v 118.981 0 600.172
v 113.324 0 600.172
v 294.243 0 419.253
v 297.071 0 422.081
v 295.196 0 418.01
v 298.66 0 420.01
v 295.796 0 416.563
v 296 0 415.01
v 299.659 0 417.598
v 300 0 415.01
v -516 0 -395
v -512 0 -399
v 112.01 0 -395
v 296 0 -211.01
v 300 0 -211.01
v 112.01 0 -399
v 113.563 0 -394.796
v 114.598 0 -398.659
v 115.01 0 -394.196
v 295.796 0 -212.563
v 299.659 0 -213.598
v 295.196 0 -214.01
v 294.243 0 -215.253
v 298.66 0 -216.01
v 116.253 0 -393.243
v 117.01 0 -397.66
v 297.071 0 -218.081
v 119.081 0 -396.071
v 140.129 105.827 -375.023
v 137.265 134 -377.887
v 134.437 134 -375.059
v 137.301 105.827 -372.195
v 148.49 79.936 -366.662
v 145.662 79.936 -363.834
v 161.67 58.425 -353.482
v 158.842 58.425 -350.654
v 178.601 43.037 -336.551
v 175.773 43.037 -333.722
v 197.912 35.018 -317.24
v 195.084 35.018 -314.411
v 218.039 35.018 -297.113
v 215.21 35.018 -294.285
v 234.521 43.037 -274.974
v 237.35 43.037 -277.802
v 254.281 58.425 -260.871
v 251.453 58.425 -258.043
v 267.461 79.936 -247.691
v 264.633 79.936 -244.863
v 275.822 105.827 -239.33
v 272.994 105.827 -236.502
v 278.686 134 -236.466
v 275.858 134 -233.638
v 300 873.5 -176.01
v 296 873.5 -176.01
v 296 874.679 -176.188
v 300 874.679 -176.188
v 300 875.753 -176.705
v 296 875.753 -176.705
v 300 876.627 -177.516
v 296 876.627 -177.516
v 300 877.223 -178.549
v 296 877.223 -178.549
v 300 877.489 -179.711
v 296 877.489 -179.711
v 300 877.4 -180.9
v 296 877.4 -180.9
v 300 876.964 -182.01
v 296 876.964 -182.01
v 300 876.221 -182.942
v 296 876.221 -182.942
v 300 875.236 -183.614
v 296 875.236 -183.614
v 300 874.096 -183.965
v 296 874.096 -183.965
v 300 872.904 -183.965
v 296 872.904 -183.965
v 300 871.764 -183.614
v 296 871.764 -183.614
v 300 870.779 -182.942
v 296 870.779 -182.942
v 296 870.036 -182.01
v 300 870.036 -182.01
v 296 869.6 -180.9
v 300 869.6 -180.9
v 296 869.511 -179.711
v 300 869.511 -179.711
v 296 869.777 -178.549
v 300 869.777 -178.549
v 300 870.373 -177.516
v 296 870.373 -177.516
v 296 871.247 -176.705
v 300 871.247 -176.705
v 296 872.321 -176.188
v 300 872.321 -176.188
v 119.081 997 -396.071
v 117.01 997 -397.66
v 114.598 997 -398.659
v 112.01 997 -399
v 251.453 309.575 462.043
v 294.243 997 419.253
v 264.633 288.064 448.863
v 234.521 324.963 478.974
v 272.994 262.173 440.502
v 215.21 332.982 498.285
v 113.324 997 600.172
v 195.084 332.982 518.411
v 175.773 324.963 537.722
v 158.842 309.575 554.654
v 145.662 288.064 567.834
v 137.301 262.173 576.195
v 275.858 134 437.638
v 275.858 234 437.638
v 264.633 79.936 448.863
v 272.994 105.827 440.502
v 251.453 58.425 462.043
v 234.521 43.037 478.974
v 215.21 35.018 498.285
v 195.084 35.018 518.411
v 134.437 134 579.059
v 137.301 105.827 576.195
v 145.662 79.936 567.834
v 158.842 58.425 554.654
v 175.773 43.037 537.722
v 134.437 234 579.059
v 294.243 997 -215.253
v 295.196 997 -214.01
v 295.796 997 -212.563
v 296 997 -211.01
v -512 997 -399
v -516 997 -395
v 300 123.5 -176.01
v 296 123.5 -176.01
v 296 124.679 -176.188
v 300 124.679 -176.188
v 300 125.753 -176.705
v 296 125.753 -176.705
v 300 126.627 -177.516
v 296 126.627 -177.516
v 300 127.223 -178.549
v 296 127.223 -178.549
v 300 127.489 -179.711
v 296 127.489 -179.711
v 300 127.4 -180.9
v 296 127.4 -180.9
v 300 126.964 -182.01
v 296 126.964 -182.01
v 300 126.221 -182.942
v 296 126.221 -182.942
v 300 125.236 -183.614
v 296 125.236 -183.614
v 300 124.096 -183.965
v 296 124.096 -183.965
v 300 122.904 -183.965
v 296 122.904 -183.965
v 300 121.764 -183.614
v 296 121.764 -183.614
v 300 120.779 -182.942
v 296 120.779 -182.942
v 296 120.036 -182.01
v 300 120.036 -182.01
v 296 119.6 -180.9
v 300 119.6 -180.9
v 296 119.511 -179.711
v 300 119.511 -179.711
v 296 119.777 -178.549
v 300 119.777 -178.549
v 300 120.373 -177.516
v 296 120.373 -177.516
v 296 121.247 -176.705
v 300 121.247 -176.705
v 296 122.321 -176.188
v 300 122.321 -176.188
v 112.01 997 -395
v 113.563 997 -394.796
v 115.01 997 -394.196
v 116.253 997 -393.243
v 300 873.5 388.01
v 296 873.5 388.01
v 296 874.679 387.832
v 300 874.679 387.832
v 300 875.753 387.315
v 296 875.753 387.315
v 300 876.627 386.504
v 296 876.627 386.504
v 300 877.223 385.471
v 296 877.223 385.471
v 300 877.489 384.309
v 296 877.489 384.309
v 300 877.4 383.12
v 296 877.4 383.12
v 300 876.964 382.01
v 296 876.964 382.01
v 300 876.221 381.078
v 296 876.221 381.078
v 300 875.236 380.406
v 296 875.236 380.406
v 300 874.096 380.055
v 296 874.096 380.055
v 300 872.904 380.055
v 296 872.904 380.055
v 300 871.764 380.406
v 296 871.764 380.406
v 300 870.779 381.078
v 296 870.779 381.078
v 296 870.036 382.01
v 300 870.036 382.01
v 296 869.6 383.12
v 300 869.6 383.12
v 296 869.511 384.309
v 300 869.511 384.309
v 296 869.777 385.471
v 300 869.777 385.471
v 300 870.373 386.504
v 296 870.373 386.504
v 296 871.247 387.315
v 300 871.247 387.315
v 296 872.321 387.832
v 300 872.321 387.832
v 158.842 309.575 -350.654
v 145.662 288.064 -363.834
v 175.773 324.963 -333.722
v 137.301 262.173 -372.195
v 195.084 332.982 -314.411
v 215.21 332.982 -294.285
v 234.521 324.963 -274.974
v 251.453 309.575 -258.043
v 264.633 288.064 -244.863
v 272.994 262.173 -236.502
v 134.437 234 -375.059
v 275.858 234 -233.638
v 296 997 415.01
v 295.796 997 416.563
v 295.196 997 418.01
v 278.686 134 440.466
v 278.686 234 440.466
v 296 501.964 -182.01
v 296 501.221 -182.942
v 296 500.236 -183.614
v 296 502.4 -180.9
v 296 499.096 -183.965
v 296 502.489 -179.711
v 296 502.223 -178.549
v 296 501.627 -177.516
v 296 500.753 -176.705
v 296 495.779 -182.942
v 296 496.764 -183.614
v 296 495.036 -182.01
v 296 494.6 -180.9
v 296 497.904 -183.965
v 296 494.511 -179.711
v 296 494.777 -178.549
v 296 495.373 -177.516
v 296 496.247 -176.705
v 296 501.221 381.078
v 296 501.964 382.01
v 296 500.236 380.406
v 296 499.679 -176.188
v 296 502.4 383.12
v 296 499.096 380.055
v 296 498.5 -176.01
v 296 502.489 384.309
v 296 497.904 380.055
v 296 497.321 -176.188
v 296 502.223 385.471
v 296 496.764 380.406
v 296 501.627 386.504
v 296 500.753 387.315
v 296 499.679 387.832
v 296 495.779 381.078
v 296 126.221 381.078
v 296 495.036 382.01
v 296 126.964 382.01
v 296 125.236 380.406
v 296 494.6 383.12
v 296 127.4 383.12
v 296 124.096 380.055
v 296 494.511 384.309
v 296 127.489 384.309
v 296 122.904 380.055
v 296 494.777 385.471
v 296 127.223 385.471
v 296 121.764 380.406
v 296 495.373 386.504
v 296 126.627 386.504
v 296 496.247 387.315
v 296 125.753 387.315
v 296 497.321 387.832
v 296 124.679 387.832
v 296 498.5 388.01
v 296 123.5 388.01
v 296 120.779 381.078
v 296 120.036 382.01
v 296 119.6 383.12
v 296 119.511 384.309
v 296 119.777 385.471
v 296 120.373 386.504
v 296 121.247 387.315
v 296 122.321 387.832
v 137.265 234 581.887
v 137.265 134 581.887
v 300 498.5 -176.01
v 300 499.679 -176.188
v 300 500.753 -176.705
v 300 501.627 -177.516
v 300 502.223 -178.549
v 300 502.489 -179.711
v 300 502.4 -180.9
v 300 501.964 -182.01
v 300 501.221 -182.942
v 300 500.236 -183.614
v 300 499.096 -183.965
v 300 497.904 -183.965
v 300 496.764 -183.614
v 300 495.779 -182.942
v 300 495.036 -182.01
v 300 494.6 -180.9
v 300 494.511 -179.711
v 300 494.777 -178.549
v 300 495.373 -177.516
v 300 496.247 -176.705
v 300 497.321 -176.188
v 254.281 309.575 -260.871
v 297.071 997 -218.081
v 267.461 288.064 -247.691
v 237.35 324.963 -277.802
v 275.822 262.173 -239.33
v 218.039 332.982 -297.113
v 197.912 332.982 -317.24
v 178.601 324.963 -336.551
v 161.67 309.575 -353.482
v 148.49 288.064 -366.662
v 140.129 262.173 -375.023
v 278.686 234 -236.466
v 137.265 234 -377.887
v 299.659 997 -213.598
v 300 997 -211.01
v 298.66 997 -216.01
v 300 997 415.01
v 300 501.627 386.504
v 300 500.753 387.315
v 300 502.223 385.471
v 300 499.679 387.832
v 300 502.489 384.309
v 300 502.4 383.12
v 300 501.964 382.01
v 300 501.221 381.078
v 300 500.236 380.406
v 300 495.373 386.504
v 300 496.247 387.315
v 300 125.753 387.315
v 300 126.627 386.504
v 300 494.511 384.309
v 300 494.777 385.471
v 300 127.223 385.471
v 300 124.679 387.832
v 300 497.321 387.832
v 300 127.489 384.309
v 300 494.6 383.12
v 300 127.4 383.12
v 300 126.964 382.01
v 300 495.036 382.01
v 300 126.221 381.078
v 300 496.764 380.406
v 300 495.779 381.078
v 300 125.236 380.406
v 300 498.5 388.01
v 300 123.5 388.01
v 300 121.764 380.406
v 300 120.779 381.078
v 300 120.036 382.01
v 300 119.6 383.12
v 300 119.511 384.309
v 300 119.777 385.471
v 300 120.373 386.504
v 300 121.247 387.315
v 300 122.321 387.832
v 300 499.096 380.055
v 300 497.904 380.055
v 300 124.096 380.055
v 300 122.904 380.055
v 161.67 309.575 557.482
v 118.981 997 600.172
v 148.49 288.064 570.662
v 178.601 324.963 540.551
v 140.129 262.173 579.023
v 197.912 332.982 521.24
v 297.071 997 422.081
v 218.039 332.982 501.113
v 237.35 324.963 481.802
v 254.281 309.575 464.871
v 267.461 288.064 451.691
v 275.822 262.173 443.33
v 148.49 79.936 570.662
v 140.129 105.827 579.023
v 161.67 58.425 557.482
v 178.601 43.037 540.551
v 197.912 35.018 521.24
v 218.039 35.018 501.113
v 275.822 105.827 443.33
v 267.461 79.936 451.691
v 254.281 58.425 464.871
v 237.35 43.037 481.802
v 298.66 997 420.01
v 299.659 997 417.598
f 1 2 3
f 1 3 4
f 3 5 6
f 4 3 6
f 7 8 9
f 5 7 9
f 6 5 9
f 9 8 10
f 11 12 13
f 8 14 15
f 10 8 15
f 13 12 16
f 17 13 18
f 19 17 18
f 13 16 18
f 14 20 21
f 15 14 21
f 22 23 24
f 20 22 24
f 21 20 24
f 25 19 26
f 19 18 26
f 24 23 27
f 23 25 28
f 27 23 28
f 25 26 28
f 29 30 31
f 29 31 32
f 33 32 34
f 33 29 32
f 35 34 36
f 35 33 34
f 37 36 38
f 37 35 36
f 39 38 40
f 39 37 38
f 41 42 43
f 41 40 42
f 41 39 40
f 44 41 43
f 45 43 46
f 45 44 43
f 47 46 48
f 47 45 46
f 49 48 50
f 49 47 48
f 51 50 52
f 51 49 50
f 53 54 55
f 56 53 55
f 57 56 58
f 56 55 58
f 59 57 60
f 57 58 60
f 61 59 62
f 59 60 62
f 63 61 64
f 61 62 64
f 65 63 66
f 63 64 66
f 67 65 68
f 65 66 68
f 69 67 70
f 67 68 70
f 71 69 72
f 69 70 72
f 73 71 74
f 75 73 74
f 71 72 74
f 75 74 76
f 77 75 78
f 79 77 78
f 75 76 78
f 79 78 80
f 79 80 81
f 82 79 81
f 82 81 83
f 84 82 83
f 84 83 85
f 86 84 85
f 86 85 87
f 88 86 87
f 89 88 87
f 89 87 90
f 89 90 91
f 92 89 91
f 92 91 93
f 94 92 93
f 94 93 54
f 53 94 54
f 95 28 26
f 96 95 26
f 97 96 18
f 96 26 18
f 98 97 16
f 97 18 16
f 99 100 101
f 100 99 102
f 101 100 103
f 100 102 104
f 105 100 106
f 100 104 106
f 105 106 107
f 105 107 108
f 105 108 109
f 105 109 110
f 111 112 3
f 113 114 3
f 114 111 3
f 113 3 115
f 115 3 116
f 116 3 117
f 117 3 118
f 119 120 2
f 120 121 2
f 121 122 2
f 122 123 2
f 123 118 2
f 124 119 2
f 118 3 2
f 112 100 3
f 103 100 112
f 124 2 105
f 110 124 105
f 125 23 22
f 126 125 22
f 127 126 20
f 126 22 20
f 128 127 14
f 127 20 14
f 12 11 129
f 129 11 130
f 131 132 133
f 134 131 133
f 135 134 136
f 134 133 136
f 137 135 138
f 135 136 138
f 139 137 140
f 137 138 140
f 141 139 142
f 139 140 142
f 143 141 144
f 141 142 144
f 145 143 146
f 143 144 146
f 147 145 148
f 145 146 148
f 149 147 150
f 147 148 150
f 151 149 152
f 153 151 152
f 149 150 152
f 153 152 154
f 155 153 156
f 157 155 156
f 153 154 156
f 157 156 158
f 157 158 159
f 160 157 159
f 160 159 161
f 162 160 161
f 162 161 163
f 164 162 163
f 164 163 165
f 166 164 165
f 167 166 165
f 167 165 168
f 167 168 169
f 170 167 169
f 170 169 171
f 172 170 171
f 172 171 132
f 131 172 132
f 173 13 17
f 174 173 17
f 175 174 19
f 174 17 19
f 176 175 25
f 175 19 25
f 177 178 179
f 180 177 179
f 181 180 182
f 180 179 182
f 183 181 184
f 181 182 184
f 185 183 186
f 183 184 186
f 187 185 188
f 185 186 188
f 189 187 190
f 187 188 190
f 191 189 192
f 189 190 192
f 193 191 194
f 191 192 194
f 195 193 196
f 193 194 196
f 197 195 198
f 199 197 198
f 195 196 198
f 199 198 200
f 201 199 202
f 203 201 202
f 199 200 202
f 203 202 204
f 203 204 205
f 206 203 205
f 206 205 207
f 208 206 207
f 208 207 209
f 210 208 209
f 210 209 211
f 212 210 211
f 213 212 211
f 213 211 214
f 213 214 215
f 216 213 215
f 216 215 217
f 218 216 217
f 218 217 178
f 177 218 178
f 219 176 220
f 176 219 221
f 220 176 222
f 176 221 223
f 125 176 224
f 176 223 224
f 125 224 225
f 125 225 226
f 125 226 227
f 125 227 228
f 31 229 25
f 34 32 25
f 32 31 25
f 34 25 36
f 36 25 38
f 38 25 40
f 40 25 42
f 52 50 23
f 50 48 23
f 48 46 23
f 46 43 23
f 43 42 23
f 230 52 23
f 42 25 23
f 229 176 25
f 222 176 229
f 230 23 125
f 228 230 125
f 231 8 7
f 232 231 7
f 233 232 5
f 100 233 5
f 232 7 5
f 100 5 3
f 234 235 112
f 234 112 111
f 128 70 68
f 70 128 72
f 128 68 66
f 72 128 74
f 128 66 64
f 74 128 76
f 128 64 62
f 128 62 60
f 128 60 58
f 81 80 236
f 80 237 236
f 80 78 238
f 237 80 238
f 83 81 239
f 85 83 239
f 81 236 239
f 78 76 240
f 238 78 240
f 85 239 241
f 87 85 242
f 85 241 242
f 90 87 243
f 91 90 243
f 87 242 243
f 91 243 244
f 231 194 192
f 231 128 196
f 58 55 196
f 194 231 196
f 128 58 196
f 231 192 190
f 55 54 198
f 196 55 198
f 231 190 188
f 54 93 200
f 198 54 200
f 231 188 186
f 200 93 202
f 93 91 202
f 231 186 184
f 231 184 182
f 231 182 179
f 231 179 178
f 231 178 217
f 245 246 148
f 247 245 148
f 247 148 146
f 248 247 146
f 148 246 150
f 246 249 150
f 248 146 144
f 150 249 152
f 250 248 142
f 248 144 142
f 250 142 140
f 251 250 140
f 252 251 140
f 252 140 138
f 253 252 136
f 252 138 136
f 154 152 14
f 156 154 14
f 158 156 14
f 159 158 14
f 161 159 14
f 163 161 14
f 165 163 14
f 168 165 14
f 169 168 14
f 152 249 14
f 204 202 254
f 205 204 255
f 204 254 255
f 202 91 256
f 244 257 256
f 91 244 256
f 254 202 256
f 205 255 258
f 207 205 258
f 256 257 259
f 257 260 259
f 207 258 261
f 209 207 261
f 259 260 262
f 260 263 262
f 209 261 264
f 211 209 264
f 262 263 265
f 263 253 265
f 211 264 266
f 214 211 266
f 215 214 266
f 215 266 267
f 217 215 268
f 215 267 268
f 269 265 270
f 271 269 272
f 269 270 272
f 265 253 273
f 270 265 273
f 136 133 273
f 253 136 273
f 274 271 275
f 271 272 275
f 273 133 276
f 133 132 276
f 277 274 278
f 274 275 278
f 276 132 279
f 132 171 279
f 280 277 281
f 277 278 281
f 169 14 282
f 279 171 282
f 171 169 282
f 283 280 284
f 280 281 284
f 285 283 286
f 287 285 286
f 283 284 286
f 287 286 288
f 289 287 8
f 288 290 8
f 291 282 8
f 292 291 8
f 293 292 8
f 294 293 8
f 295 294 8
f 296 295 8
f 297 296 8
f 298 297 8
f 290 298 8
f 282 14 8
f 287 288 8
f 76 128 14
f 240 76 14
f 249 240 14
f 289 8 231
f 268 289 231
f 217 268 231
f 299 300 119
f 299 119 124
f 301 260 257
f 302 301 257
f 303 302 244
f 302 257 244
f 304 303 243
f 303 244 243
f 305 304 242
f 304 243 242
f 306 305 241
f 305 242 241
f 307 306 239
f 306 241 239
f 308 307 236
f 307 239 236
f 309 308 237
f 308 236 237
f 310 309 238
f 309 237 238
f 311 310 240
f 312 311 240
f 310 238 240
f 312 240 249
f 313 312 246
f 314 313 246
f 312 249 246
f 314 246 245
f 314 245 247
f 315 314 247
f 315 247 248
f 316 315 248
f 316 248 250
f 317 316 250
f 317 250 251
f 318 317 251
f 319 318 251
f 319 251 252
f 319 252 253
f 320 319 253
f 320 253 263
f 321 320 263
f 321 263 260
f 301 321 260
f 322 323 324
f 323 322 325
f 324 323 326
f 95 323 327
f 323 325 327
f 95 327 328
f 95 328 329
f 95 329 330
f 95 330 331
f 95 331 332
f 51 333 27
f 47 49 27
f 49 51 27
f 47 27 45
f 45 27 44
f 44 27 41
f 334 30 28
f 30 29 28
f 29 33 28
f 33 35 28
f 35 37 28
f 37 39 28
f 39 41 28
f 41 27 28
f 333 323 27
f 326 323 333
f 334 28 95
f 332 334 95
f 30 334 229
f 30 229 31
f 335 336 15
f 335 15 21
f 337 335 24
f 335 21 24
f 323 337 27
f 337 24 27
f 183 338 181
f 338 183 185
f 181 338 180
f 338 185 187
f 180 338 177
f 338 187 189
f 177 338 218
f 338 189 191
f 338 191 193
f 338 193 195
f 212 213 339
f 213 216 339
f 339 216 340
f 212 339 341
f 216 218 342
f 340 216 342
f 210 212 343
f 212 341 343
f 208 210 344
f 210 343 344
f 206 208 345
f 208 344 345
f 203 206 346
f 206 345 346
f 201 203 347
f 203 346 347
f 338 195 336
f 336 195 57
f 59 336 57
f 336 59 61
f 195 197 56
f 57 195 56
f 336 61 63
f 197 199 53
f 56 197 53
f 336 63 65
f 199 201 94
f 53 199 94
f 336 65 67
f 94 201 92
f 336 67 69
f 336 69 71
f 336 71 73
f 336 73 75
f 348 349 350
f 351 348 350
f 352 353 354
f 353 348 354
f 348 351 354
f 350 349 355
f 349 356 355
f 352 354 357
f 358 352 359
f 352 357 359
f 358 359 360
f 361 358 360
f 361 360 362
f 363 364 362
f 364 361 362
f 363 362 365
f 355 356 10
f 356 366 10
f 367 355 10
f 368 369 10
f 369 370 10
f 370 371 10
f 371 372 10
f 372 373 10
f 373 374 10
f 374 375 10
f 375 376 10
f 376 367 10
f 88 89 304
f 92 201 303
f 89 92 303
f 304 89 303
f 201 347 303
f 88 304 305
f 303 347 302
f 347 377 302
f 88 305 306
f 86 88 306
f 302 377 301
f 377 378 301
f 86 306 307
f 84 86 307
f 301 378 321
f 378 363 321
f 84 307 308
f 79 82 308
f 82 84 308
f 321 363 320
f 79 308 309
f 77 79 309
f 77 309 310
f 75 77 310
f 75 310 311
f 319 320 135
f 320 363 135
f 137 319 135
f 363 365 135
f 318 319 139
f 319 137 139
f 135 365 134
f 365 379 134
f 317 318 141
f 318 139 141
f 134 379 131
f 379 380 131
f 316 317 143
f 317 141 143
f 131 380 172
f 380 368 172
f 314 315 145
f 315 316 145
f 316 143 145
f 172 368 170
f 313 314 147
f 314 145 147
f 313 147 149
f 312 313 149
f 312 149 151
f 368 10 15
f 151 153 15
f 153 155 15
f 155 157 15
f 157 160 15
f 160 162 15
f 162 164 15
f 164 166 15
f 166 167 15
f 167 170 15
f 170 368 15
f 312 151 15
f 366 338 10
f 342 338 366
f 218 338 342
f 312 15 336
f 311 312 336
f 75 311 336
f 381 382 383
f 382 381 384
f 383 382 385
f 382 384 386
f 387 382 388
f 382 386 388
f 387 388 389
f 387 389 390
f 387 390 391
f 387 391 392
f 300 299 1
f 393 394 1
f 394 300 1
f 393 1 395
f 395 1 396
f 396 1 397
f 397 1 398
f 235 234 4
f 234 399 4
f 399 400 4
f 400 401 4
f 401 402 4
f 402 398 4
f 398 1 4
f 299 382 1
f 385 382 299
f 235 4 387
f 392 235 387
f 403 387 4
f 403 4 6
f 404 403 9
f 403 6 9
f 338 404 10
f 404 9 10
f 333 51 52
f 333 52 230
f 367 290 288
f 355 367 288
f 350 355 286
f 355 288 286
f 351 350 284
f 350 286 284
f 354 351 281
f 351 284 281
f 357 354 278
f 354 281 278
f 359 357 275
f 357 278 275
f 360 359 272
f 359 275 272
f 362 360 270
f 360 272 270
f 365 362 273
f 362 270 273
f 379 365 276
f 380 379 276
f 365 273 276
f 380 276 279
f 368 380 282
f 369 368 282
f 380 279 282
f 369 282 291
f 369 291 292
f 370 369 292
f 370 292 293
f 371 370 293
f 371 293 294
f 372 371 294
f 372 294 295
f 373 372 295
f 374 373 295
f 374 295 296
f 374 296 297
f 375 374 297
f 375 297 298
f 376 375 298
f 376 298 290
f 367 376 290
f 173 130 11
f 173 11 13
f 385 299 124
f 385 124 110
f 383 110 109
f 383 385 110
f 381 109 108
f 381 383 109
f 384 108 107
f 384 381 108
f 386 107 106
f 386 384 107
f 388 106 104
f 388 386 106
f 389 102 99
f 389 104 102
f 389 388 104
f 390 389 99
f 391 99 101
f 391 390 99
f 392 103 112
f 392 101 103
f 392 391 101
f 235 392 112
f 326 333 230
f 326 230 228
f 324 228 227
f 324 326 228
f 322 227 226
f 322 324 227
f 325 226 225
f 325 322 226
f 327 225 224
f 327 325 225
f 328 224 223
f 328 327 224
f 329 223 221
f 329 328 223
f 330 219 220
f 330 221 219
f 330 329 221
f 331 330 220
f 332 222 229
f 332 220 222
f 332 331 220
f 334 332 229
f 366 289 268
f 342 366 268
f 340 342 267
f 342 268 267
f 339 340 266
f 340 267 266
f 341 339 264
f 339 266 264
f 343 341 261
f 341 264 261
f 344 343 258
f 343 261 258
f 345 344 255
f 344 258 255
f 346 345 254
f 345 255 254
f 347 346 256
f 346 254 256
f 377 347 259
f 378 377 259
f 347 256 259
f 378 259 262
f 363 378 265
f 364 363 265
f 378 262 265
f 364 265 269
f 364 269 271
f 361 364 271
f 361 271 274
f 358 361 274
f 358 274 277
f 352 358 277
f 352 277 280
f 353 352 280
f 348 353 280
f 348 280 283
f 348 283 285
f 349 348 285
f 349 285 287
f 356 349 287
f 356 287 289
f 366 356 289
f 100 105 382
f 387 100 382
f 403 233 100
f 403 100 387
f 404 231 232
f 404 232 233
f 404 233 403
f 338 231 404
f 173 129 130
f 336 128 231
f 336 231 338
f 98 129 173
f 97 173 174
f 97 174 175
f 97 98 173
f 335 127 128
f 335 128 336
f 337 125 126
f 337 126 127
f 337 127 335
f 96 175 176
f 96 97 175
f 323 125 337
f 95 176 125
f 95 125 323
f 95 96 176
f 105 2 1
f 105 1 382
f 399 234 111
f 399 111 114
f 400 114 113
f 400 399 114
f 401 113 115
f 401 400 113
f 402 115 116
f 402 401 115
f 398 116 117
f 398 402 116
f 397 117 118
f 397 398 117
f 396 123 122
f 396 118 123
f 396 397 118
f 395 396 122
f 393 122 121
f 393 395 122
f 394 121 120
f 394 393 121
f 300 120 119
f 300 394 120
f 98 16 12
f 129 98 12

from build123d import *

# Parameters (mm, degrees)
BASE_FLANGE1_DEPTH   = 997
CUT_EXTRUDE1_DEPTH   = 10
SKETCH5_R            = 4
CUT_EXTRUDE2_DEPTH   = 10
CUT_EXTRUDE4_DEPTH   = 10
LPATTERN1_COUNT      = 3
LPATTERN1_PITCH      = 375
LPATTERN1_COUNT_DIR2 = 2
LPATTERN1_PITCH_DIR2 = 564.02
CHAMFER1_SIZE        = 4


# Sheet-metal steps are written as plain solids
with BuildPart() as part:
    # Sketch1 → Base-Flange1 (new body)
    with BuildSketch(Plane(origin=(0, 0, 0), x_dir=(1, 0, 0), z_dir=(0, 1, 0))):
        with BuildLine():
            Line((116.152236891, -603), (297.071067812, -422.08116908))
            ThreePointArc((297.071067812, -422.08116908), (299.238795325, -418.836935591), (300, -415.010101268))
            Line((300, -415.010101268), (300, 211.010101268))
            ThreePointArc((300, 211.010101268), (299.238795325, 214.836935591), (297.071067812, 218.08116908))
            Line((297.071067812, 218.08116908), (119.08116908, 396.071067812))
            ThreePointArc((119.08116908, 396.071067812), (115.836935591, 398.238795325), (112.010101268, 399))
            Line((112.010101268, 399), (-516, 399))
            Line((-516, 399), (-516, 395))
            Line((-516, 395), (112.010101268, 395))
            ThreePointArc((112.010101268, 395), (114.306201862, 394.543277195), (116.252741955, 393.242640687))
            Line((116.252741955, 393.242640687), (294.242640687, 215.252741955))
            ThreePointArc((294.242640687, 215.252741955), (295.543277195, 213.306201862), (296, 211.010101268))
            Line((296, 211.010101268), (296, -415.010101268))
            ThreePointArc((296, -415.010101268), (295.543277195, -417.306201862), (294.242640687, -419.252741955))
            Line((294.242640687, -419.252741955), (113.323809767, -600.171572875))
            Line((113.323809767, -600.171572875), (116.152236891, -603))
        make_face()
    extrude(amount=BASE_FLANGE1_DEPTH)

    # Sketch2 → Cut-Extrude1 (cut)
    with BuildSketch(Plane(origin=(257.576118446, 0, -257.576118446), x_dir=(-0.7071067811865485, 0, -0.7071067811865466), z_dir=(0.7071067811865466, 0, -0.7071067811865485))):
        with BuildLine():
            Line((170.145706961, 234), (170.145706961, 134))
            ThreePointArc((170.145706961, 134), (70.145706961, 34), (-29.854293039, 134))
            Line((-29.854293039, 134), (-29.854293039, 234))
            ThreePointArc((-29.854293039, 234), (70.145706961, 334), (170.145706961, 234))
        make_face()
    extrude(amount=-CUT_EXTRUDE1_DEPTH, mode=Mode.SUBTRACT)

    # Sketch5 → Cut-Extrude2 (cut)
    with BuildSketch(Plane.ZY.offset(-296)):
        with Locations((384.010101268, 873.5)):
            Circle(SKETCH5_R)
    cut_extrude2 = extrude(amount=-CUT_EXTRUDE2_DEPTH, mode=Mode.SUBTRACT)

    # Sketch7 → Cut-Extrude4 (cut)
    with BuildSketch(Plane(origin=(359.576118446, 0, 359.576118446), x_dir=(0.7071067811865416, 0, -0.7071067811865536), z_dir=(0.7071067811865536, 0, 0.7071067811865416))):
        with BuildLine():
            Line((-114.395490323, 234), (-114.395490323, 134))
            ThreePointArc((-114.395490323, 134), (-214.395490323, 34), (-314.395490323, 134))
            Line((-314.395490323, 134), (-314.395490323, 234))
            ThreePointArc((-314.395490323, 234), (-214.395490323, 334), (-114.395490323, 234))
        make_face()
    extrude(amount=-CUT_EXTRUDE4_DEPTH, mode=Mode.SUBTRACT)

    # LPattern1: Cut-Extrude2 3 × 2
    with Locations(*[(0, -i * LPATTERN1_PITCH, -j * LPATTERN1_PITCH_DIR2) for i in range(LPATTERN1_COUNT) for j in range(LPATTERN1_COUNT_DIR2) if (i, j) != (0, 0)]):
        add(cut_extrude2, mode=Mode.SUBTRACT)

    # Chamfer1
    chamfer1_edges = [part.edges().sort_by_distance(p)[0] for p in [
        (116.152236891, 498.5, 603),
        (-516, 498.5, -399),
    ]]
    chamfer(chamfer1_edges, length=CHAMFER1_SIZE - 0.0001)  # a hair under: the kernel refuses the full size


solid = part.part
